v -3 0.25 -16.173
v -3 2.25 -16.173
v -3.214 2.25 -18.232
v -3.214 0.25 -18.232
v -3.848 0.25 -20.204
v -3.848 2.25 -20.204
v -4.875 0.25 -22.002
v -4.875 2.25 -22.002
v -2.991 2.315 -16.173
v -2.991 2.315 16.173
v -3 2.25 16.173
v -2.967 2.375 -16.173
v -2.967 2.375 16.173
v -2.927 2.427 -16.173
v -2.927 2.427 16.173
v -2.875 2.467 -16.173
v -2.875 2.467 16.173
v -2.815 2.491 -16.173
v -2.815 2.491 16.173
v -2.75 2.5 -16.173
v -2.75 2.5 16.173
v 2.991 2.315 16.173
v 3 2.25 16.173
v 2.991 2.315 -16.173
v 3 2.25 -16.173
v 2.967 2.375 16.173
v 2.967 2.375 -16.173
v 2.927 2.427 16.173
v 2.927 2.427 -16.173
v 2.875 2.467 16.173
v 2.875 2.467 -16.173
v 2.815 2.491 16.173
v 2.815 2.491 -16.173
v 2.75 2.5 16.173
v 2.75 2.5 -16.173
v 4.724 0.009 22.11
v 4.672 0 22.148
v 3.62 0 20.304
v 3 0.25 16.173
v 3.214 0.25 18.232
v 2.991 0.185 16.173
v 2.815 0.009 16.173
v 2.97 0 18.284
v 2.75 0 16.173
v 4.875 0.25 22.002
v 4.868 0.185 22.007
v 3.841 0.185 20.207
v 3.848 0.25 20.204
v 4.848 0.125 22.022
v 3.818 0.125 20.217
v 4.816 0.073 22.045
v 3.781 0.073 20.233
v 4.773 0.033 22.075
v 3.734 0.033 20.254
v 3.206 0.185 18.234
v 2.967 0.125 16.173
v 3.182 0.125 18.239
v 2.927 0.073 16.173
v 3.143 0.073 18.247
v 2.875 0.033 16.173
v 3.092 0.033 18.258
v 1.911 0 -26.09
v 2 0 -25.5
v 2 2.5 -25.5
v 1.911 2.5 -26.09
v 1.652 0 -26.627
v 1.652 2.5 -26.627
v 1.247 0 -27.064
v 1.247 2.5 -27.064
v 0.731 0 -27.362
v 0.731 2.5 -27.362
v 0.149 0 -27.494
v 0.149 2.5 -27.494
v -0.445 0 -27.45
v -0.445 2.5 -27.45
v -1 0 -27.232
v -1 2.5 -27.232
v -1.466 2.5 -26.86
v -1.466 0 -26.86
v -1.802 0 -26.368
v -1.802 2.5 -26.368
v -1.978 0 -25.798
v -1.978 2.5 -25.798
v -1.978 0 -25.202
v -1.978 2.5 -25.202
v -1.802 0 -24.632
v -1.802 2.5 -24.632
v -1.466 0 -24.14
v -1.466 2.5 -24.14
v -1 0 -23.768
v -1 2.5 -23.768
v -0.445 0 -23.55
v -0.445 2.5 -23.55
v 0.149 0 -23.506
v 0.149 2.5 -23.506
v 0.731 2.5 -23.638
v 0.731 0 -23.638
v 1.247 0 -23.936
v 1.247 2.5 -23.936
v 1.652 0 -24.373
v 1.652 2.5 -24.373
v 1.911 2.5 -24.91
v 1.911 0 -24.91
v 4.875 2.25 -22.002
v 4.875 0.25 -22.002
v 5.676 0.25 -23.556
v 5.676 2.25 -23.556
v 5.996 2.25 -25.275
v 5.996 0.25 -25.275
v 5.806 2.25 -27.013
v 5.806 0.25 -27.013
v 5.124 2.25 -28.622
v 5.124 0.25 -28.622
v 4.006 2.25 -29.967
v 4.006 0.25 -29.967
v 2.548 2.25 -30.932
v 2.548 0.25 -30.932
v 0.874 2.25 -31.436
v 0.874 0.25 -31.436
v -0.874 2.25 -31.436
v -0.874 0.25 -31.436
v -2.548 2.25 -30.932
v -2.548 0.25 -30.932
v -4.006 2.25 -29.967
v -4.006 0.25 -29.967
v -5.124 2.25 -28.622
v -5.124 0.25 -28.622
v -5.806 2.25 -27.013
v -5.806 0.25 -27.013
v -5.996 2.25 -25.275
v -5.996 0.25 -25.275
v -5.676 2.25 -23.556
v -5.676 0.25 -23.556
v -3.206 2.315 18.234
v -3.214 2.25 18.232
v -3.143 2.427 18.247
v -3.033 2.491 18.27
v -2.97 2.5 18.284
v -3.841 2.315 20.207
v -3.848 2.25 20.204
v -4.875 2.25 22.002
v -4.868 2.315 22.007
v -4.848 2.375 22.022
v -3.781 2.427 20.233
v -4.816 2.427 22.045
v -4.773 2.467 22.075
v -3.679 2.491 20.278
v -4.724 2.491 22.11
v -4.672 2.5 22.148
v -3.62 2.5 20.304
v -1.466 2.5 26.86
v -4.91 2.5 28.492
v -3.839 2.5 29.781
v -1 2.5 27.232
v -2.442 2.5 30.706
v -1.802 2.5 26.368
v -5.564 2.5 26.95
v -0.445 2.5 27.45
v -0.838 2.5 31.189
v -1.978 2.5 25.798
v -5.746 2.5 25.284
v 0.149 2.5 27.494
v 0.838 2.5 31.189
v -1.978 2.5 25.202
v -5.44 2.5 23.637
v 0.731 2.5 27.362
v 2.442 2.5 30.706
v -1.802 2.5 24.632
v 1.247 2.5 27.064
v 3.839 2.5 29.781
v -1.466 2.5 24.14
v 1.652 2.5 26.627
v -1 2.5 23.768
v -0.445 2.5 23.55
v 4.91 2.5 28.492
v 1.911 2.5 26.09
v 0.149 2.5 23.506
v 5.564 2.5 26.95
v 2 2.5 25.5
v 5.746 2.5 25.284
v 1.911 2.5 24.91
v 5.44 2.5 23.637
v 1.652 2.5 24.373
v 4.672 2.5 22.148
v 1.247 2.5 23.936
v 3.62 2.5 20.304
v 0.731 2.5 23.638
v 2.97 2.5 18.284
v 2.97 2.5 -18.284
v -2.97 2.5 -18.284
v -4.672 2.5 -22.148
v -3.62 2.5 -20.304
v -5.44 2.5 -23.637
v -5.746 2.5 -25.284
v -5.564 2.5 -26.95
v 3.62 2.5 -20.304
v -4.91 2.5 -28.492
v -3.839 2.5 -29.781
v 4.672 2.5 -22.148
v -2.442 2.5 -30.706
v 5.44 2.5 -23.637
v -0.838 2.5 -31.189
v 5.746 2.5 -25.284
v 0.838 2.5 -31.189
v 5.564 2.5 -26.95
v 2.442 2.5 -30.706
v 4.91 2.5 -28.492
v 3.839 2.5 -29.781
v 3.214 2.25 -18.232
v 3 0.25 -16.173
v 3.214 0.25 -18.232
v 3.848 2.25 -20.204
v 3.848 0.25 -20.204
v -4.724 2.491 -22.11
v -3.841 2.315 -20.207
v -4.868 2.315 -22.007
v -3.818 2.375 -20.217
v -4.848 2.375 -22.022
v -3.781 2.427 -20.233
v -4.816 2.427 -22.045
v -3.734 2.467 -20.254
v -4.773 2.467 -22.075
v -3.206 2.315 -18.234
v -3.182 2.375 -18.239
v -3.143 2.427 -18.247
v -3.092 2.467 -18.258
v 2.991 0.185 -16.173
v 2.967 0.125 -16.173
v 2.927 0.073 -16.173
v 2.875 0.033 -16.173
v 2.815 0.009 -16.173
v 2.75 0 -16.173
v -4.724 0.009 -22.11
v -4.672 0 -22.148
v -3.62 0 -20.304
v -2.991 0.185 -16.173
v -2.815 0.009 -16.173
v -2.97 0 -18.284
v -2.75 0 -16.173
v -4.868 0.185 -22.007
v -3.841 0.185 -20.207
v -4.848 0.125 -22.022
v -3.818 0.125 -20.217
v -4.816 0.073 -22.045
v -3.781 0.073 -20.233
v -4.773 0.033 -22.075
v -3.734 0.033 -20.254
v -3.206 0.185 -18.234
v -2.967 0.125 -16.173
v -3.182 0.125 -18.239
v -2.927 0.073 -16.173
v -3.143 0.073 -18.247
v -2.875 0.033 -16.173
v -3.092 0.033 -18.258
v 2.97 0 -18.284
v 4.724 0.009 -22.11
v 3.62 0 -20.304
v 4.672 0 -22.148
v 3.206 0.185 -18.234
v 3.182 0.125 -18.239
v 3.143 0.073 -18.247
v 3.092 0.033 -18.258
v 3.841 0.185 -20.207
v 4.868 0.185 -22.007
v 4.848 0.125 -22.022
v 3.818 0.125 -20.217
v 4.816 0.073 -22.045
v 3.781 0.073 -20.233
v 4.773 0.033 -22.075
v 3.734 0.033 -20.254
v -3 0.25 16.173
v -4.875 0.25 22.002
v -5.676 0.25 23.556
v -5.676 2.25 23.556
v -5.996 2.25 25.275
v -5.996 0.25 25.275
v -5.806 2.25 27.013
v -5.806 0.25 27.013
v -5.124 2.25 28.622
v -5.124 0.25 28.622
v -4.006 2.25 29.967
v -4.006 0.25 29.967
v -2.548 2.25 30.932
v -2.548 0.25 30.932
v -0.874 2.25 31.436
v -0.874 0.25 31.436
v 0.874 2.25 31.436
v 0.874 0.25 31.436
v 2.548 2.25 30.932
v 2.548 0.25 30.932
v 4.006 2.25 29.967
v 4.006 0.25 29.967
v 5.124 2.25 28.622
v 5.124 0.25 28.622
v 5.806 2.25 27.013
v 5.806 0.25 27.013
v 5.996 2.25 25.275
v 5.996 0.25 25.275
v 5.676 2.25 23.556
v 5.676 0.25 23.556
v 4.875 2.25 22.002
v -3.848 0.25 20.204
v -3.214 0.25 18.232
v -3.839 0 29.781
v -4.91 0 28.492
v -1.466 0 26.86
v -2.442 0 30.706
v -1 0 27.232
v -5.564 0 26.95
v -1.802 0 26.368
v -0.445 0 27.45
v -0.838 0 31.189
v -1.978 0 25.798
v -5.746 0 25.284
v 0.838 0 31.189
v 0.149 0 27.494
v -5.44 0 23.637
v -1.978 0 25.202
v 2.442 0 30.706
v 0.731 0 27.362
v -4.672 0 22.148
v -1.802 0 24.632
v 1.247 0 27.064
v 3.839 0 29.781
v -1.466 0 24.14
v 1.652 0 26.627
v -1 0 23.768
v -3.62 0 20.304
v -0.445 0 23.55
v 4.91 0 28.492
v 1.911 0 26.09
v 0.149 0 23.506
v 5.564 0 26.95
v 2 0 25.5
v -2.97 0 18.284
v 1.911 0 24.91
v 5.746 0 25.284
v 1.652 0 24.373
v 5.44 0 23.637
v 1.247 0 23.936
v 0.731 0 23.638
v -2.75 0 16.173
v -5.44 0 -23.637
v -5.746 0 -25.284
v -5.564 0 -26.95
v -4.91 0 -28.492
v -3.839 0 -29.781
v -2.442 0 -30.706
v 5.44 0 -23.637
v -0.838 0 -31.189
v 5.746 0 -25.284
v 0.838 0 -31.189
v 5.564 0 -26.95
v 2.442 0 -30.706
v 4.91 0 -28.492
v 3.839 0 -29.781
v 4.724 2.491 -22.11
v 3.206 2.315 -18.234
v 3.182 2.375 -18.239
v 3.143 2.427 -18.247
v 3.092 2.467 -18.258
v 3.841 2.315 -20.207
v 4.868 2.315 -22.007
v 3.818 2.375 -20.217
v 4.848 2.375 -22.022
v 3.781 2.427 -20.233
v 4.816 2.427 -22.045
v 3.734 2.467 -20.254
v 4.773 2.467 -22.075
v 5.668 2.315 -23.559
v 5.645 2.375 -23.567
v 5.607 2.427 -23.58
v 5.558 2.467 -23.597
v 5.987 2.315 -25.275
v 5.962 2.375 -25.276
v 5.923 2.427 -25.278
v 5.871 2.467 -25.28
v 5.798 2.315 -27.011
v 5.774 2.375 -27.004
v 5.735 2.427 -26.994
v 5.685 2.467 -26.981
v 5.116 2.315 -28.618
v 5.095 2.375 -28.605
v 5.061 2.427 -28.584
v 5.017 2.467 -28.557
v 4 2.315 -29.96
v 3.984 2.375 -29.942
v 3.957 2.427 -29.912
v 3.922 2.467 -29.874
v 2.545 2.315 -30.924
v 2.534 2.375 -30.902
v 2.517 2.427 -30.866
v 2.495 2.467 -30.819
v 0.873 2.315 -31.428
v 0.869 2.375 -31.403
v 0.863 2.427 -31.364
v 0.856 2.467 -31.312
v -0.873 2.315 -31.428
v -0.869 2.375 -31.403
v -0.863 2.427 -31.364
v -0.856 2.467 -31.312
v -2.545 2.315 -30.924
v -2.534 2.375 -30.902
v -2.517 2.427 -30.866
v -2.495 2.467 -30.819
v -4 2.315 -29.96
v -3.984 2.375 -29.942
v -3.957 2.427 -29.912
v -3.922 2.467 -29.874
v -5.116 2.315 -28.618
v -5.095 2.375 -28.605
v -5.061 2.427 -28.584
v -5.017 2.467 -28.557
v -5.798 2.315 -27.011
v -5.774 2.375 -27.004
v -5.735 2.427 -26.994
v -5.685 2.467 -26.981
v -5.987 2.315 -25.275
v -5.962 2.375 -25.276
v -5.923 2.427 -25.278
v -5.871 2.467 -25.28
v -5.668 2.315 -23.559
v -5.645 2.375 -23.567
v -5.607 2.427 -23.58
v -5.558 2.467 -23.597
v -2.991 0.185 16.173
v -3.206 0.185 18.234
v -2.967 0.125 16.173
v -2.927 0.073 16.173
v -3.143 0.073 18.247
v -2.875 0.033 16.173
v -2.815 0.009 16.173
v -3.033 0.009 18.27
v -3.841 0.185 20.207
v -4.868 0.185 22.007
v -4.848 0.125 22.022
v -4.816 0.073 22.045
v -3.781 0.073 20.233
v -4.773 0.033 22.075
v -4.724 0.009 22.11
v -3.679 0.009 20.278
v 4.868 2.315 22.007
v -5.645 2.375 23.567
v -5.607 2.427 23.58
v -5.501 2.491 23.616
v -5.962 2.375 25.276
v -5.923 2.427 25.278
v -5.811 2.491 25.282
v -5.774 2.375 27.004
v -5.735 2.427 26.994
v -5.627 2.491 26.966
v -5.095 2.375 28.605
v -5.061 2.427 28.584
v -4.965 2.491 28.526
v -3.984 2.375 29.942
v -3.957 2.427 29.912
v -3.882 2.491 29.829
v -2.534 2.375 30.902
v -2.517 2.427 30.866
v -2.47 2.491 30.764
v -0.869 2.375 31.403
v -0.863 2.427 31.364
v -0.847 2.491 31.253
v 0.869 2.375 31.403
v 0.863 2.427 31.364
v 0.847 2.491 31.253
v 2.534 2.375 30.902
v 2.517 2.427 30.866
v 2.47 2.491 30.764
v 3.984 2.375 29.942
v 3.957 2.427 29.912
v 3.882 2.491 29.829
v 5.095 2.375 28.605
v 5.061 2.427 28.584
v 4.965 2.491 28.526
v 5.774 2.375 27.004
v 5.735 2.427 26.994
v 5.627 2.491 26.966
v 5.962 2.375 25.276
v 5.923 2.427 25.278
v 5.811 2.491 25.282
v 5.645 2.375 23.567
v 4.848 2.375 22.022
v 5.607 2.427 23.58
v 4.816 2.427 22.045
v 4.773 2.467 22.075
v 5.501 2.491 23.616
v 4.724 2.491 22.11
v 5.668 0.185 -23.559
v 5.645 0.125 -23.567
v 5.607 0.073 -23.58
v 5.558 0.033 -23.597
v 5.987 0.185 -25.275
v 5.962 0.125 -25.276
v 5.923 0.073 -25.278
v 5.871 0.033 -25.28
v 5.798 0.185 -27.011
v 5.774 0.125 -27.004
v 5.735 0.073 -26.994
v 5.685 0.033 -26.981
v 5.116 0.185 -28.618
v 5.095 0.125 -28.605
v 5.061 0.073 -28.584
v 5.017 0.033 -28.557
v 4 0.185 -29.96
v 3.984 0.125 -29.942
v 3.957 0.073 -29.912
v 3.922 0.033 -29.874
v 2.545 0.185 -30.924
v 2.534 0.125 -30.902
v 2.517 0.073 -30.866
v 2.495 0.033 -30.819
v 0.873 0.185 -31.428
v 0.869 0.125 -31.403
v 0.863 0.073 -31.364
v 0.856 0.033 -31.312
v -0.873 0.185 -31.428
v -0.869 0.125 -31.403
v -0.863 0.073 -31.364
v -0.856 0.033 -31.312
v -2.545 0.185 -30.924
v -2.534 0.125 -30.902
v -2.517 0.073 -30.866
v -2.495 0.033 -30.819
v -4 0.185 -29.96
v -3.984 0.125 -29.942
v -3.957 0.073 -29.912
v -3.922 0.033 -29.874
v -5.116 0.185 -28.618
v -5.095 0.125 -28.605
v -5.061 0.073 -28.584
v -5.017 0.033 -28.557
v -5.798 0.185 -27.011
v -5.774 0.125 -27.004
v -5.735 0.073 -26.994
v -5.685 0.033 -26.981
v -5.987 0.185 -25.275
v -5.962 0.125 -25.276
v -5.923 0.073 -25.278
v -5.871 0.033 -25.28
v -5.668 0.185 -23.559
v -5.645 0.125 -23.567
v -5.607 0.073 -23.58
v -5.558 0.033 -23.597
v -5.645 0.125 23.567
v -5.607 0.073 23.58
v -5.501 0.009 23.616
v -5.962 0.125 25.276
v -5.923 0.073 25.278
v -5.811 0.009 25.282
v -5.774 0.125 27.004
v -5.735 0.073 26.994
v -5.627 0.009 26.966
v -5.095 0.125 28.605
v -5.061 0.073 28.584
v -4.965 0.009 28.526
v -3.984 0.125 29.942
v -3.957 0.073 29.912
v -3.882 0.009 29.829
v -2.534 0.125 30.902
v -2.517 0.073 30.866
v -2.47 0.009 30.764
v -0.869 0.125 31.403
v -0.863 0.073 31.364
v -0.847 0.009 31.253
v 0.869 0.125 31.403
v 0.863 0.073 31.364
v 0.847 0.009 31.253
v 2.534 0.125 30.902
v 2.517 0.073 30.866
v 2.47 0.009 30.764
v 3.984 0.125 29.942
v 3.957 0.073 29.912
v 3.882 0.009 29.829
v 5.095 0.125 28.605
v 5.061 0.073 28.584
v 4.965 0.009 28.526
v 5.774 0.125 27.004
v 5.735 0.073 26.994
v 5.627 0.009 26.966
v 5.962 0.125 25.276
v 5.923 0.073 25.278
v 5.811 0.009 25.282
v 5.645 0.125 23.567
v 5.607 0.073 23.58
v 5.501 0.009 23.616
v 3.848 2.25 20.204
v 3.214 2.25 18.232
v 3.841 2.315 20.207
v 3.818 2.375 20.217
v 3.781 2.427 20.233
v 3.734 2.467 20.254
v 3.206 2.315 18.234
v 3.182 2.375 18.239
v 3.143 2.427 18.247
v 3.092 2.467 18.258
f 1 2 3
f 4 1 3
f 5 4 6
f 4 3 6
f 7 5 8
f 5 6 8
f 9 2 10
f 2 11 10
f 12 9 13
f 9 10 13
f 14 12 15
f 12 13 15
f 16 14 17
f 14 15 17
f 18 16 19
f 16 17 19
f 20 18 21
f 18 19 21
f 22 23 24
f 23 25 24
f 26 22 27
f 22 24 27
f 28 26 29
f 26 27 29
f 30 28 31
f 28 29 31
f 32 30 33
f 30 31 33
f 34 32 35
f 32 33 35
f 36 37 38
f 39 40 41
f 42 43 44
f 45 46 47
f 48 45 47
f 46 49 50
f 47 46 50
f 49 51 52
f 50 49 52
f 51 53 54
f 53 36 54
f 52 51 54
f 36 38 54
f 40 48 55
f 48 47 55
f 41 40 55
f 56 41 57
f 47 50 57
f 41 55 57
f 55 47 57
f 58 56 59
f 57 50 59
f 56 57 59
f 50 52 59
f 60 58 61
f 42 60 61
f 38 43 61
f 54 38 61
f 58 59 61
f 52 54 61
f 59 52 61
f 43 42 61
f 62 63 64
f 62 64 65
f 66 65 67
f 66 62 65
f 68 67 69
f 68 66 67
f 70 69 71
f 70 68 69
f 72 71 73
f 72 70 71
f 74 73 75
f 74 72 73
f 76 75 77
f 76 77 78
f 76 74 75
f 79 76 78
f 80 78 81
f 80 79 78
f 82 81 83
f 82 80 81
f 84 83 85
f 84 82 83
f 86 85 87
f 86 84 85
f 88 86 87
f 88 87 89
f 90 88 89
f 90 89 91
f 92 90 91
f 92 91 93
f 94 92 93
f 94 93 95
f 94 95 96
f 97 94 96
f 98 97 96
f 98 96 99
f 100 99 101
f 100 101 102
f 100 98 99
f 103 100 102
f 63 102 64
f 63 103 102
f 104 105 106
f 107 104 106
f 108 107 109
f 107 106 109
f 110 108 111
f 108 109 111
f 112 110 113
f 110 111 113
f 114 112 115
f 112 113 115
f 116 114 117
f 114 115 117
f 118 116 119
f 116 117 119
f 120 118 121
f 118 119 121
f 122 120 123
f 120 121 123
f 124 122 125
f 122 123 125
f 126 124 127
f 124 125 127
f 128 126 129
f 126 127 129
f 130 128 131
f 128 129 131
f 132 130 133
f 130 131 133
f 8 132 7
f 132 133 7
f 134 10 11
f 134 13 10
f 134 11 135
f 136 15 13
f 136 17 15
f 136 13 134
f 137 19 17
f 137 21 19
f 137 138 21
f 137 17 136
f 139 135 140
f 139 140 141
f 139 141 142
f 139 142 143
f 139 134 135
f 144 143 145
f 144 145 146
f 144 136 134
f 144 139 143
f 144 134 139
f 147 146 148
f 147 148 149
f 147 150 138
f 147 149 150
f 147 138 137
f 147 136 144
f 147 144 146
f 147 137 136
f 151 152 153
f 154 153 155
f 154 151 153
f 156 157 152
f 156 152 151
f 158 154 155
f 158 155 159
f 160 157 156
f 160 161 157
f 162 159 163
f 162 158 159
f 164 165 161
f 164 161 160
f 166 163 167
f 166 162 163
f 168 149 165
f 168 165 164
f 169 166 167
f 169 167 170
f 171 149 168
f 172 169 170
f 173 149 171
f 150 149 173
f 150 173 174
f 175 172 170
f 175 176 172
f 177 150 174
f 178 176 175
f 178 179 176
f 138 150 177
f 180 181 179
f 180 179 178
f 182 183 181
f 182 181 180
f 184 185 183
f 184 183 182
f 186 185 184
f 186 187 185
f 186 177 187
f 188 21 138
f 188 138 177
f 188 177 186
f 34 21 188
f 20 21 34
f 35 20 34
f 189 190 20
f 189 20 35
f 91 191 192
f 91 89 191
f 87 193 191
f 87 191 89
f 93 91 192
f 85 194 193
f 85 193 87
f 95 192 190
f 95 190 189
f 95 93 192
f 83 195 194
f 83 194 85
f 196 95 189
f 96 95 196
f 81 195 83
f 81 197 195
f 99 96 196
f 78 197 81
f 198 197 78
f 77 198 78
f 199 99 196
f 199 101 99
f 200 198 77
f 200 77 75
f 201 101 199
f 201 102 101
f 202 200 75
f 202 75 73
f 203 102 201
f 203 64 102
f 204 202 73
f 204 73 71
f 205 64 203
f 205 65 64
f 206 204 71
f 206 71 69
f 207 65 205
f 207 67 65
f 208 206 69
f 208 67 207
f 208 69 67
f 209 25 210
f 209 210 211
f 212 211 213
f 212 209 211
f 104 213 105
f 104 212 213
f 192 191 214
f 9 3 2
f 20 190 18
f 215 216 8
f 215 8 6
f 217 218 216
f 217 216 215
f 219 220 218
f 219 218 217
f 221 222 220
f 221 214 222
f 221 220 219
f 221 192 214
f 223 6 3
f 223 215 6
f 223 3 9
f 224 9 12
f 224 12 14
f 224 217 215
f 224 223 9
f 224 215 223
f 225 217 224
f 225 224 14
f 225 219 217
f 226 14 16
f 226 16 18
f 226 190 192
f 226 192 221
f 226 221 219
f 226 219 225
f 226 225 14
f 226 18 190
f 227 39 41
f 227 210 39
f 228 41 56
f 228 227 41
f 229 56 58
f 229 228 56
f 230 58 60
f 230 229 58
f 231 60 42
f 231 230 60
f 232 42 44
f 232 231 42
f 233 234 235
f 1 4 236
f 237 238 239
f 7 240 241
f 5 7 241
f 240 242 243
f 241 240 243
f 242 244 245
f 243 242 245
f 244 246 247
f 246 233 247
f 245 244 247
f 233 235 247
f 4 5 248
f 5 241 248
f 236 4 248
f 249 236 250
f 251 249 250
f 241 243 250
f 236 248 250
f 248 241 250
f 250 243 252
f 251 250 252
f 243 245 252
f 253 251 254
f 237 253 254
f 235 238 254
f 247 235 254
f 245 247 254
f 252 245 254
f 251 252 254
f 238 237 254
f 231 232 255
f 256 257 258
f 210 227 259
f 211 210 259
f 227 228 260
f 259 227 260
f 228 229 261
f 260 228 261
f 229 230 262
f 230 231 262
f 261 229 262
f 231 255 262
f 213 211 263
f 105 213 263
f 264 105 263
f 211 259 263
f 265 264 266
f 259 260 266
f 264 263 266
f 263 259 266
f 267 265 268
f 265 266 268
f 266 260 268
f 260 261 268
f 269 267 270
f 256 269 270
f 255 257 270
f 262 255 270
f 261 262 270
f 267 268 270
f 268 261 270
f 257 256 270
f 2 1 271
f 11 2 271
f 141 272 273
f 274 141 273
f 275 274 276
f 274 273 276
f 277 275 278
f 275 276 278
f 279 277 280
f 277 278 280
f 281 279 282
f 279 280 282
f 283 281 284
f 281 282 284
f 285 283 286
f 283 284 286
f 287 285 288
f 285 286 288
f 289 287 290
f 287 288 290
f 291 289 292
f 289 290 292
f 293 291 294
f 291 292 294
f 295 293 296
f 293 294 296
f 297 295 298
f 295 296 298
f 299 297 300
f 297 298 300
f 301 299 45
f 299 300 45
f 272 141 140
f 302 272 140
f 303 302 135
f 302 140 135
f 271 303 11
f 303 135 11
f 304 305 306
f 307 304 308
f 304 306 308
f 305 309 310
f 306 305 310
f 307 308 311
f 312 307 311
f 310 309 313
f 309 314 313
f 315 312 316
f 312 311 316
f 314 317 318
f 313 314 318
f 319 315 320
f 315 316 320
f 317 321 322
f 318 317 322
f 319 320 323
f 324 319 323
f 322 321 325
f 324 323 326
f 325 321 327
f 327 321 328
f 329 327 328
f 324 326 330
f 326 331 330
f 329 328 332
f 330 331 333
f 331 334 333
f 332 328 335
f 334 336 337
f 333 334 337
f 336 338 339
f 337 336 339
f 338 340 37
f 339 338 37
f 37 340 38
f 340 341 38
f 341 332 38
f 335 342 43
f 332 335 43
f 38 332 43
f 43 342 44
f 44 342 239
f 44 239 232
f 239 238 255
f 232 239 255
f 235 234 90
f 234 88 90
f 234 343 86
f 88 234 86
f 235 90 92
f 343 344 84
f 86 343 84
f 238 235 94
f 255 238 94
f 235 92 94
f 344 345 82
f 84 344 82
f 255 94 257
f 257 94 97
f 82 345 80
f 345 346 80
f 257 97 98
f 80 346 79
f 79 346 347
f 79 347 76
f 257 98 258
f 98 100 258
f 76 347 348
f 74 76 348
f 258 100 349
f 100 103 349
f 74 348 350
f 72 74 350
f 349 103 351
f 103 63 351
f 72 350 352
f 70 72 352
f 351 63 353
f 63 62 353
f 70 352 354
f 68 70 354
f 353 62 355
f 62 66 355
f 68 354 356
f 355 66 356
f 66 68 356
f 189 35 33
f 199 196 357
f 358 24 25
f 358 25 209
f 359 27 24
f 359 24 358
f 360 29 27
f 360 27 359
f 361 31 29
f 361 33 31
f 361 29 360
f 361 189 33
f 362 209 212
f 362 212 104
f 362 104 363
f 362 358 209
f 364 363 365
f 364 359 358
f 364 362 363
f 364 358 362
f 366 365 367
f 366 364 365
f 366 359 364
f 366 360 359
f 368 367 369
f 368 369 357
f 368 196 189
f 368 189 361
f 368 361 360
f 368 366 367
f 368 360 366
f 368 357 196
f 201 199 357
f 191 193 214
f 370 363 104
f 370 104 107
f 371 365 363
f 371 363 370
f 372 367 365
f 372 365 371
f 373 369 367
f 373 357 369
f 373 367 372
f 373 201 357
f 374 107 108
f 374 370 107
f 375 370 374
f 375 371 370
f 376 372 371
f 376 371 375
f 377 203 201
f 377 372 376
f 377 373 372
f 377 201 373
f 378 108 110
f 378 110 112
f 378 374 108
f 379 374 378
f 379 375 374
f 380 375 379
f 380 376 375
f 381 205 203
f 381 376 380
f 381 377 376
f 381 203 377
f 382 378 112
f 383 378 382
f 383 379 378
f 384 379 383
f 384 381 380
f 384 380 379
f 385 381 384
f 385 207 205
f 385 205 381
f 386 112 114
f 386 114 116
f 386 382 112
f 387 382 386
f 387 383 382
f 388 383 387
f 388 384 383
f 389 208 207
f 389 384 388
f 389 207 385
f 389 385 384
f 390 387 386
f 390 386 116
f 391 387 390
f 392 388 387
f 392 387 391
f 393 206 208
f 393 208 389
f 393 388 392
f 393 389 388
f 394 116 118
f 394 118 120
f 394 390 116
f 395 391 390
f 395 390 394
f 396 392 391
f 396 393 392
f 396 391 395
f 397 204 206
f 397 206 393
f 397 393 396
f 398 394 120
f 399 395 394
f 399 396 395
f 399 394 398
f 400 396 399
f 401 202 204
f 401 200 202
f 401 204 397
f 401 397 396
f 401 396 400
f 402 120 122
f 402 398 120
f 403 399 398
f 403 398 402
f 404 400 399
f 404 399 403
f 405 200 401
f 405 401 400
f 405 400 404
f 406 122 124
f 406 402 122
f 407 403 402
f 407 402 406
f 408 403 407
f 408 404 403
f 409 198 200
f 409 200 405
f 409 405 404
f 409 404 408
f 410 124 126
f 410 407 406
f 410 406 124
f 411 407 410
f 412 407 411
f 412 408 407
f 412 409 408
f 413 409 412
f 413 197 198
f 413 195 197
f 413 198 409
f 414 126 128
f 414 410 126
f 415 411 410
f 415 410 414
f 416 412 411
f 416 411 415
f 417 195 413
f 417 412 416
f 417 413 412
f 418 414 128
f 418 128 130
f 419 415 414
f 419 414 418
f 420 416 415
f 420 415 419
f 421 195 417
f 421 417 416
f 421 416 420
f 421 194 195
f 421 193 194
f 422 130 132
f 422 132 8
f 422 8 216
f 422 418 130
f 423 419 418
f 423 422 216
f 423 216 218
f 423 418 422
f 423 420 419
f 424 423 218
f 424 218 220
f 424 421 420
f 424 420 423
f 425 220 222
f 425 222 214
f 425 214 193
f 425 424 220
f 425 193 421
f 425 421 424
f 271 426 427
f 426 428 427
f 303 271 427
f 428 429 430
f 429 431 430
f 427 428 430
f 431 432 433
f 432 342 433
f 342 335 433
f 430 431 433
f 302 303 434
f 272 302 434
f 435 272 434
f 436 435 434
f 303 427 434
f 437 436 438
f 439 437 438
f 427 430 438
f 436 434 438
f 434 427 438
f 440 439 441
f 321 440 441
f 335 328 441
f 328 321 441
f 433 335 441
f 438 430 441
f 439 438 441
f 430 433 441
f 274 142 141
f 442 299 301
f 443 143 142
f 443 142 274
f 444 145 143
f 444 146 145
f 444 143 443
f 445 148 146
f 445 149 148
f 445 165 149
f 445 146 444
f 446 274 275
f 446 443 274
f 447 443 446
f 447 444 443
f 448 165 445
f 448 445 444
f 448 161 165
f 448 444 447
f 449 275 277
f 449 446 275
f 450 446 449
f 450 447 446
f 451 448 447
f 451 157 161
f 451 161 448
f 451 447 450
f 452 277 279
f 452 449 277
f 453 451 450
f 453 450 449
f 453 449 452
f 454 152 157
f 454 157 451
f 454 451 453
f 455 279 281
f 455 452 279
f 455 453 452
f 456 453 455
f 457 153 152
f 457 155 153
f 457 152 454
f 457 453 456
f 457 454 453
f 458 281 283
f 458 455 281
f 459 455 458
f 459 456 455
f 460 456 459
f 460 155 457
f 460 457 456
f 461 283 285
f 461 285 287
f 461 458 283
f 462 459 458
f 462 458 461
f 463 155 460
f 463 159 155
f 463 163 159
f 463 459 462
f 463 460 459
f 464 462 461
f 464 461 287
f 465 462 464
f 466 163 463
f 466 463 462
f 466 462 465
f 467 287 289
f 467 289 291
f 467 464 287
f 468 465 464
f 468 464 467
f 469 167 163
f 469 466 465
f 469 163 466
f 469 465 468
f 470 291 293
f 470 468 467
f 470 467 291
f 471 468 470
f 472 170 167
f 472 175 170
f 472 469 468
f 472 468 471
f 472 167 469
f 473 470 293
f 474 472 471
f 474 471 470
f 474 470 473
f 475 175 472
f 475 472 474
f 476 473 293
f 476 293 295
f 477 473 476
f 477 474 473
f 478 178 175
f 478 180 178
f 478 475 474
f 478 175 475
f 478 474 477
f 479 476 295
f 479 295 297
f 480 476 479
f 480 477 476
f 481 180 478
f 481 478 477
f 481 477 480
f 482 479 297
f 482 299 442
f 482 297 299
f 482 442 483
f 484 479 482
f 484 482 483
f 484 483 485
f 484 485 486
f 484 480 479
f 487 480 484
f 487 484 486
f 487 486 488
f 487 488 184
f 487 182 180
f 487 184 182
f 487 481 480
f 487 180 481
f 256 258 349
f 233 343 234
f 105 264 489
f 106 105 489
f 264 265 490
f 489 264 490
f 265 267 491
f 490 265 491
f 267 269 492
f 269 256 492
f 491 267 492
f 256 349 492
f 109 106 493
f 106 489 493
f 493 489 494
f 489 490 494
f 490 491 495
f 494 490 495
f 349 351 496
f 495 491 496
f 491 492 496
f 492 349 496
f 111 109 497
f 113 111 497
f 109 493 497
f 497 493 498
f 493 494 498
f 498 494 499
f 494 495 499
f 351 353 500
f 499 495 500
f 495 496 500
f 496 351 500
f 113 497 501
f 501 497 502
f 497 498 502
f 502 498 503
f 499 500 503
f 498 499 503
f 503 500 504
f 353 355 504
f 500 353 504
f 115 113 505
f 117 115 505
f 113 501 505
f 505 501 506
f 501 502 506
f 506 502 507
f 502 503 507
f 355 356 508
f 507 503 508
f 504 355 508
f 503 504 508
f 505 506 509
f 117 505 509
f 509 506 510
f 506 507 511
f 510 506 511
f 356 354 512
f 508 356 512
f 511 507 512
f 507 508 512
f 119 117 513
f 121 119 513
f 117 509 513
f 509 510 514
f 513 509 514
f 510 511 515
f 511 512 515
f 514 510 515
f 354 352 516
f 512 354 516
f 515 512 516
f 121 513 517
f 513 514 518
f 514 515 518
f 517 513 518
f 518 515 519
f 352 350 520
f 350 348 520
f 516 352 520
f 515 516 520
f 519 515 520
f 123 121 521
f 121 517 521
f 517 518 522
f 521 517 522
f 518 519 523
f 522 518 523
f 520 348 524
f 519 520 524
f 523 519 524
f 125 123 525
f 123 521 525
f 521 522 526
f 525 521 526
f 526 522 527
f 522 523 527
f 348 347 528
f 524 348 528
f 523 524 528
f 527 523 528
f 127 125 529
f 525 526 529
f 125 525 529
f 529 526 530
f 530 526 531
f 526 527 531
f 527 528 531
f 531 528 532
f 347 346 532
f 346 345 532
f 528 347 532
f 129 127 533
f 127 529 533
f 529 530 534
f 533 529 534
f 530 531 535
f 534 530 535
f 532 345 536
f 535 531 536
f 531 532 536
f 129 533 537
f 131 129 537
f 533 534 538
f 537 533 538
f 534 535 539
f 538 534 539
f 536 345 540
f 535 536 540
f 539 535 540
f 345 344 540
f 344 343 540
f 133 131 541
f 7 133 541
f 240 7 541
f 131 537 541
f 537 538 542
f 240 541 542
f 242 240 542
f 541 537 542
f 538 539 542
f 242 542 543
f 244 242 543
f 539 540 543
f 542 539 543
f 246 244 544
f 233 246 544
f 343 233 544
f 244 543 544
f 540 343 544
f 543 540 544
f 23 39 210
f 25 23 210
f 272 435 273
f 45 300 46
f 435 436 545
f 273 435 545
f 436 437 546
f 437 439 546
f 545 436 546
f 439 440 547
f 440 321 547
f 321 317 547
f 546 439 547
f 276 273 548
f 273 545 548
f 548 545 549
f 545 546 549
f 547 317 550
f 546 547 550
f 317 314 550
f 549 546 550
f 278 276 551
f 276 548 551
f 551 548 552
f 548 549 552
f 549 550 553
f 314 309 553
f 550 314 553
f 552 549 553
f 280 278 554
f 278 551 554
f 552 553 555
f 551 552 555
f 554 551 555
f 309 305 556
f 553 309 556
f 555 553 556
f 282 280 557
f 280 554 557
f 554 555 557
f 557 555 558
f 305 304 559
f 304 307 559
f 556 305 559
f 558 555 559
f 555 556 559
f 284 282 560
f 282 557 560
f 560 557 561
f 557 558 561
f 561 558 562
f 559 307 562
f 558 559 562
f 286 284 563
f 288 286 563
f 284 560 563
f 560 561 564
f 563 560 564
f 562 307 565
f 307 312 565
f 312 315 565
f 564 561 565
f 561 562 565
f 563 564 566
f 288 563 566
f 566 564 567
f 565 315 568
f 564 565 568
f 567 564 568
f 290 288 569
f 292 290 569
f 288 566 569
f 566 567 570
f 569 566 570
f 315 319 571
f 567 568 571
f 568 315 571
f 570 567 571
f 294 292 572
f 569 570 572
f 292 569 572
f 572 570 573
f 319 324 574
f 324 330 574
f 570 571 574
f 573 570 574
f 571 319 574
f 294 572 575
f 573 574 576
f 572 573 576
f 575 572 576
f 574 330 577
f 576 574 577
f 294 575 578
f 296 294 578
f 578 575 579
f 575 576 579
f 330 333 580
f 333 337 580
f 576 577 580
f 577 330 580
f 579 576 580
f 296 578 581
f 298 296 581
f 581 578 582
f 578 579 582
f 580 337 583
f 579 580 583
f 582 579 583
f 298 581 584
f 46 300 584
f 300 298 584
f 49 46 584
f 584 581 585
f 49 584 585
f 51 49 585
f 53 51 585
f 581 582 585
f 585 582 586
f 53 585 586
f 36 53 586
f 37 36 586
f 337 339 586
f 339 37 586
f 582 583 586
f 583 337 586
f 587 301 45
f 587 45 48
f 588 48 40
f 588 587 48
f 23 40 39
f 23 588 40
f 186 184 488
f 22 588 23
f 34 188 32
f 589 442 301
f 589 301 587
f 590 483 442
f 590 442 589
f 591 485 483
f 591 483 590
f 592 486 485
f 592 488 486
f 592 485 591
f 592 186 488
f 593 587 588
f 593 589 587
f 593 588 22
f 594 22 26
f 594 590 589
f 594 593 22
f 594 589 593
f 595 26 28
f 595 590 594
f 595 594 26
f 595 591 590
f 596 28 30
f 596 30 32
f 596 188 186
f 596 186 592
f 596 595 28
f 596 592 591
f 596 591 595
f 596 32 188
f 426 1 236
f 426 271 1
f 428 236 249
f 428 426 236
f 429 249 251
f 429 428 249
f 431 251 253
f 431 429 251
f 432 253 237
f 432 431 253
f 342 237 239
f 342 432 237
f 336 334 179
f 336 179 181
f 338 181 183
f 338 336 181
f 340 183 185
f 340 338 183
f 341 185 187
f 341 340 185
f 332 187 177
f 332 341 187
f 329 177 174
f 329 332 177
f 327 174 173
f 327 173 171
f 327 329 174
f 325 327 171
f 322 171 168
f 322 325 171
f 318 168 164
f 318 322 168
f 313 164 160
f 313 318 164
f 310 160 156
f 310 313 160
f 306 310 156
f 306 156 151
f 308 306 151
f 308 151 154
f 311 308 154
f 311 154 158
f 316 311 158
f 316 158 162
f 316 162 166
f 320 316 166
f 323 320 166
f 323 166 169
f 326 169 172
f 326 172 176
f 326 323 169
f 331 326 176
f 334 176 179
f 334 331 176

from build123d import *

# Parameters (mm, degrees)
SKETCH1_R           = 2
BOSS_EXTRUDE1_DEPTH = 2.5
FILLET1_R           = 10
FILLET2_R           = 0.25


with BuildPart() as part:
    # Sketch1 → Boss-Extrude1 (new body)
    with BuildSketch(Plane(origin=(0, 0, 0), x_dir=(1, 0, 0), z_dir=(0, 1, 0))):
        with BuildLine():
            ThreePointArc((-3, -20.303847577), (0, -31.5), (3, -20.303847577))
            Line((3, -20.303847577), (3, 20.303847577))
            ThreePointArc((3, 20.303847577), (0, 31.5), (-3, 20.303847577))
            Line((-3, 20.303847577), (-3, -20.303847577))
        make_face()
        with Locations((0, -25.5)):
            Circle(SKETCH1_R, mode=Mode.SUBTRACT)
        with Locations((0, 25.5)):
            Circle(SKETCH1_R, mode=Mode.SUBTRACT)
    extrude(amount=BOSS_EXTRUDE1_DEPTH)

    # Fillet1
    fillet1_edges = [part.edges().sort_by_distance(p)[0] for p in [
        (-3, 1.25, 20.303847577),
        (-3, 1.25, -20.303847577),
        (3, 1.25, -20.303847577),
        (3, 1.25, 20.303847577),
    ]]
    fillet(fillet1_edges, radius=FILLET1_R)

    # Fillet2
    fillet2_edges = [part.edges().sort_by_distance(p)[0] for p in [
        (0, 0, 31.5),
        (0, 2.5, 31.5),
        (-3, 0, 0),
        (-3, 2.5, 0),
        (0, 0, -31.5),
        (0, 2.5, -31.5),
        (3, 0, 0),
        (3, 2.5, 0),
        (-3.480283618, 0, 19.234483125),
        (-3.480283618, 2.5, 19.234483125),
        (-3.480283618, 0, -19.234483125),
        (-3.480283618, 2.5, -19.234483125),
        (3.480283618, 0, -19.234483125),
        (3.480283618, 2.5, -19.234483125),
        (3.480283618, 0, 19.234483125),
        (3.480283618, 2.5, 19.234483125),
    ]]
    fillet(fillet2_edges, radius=FILLET2_R)


solid = part.part
